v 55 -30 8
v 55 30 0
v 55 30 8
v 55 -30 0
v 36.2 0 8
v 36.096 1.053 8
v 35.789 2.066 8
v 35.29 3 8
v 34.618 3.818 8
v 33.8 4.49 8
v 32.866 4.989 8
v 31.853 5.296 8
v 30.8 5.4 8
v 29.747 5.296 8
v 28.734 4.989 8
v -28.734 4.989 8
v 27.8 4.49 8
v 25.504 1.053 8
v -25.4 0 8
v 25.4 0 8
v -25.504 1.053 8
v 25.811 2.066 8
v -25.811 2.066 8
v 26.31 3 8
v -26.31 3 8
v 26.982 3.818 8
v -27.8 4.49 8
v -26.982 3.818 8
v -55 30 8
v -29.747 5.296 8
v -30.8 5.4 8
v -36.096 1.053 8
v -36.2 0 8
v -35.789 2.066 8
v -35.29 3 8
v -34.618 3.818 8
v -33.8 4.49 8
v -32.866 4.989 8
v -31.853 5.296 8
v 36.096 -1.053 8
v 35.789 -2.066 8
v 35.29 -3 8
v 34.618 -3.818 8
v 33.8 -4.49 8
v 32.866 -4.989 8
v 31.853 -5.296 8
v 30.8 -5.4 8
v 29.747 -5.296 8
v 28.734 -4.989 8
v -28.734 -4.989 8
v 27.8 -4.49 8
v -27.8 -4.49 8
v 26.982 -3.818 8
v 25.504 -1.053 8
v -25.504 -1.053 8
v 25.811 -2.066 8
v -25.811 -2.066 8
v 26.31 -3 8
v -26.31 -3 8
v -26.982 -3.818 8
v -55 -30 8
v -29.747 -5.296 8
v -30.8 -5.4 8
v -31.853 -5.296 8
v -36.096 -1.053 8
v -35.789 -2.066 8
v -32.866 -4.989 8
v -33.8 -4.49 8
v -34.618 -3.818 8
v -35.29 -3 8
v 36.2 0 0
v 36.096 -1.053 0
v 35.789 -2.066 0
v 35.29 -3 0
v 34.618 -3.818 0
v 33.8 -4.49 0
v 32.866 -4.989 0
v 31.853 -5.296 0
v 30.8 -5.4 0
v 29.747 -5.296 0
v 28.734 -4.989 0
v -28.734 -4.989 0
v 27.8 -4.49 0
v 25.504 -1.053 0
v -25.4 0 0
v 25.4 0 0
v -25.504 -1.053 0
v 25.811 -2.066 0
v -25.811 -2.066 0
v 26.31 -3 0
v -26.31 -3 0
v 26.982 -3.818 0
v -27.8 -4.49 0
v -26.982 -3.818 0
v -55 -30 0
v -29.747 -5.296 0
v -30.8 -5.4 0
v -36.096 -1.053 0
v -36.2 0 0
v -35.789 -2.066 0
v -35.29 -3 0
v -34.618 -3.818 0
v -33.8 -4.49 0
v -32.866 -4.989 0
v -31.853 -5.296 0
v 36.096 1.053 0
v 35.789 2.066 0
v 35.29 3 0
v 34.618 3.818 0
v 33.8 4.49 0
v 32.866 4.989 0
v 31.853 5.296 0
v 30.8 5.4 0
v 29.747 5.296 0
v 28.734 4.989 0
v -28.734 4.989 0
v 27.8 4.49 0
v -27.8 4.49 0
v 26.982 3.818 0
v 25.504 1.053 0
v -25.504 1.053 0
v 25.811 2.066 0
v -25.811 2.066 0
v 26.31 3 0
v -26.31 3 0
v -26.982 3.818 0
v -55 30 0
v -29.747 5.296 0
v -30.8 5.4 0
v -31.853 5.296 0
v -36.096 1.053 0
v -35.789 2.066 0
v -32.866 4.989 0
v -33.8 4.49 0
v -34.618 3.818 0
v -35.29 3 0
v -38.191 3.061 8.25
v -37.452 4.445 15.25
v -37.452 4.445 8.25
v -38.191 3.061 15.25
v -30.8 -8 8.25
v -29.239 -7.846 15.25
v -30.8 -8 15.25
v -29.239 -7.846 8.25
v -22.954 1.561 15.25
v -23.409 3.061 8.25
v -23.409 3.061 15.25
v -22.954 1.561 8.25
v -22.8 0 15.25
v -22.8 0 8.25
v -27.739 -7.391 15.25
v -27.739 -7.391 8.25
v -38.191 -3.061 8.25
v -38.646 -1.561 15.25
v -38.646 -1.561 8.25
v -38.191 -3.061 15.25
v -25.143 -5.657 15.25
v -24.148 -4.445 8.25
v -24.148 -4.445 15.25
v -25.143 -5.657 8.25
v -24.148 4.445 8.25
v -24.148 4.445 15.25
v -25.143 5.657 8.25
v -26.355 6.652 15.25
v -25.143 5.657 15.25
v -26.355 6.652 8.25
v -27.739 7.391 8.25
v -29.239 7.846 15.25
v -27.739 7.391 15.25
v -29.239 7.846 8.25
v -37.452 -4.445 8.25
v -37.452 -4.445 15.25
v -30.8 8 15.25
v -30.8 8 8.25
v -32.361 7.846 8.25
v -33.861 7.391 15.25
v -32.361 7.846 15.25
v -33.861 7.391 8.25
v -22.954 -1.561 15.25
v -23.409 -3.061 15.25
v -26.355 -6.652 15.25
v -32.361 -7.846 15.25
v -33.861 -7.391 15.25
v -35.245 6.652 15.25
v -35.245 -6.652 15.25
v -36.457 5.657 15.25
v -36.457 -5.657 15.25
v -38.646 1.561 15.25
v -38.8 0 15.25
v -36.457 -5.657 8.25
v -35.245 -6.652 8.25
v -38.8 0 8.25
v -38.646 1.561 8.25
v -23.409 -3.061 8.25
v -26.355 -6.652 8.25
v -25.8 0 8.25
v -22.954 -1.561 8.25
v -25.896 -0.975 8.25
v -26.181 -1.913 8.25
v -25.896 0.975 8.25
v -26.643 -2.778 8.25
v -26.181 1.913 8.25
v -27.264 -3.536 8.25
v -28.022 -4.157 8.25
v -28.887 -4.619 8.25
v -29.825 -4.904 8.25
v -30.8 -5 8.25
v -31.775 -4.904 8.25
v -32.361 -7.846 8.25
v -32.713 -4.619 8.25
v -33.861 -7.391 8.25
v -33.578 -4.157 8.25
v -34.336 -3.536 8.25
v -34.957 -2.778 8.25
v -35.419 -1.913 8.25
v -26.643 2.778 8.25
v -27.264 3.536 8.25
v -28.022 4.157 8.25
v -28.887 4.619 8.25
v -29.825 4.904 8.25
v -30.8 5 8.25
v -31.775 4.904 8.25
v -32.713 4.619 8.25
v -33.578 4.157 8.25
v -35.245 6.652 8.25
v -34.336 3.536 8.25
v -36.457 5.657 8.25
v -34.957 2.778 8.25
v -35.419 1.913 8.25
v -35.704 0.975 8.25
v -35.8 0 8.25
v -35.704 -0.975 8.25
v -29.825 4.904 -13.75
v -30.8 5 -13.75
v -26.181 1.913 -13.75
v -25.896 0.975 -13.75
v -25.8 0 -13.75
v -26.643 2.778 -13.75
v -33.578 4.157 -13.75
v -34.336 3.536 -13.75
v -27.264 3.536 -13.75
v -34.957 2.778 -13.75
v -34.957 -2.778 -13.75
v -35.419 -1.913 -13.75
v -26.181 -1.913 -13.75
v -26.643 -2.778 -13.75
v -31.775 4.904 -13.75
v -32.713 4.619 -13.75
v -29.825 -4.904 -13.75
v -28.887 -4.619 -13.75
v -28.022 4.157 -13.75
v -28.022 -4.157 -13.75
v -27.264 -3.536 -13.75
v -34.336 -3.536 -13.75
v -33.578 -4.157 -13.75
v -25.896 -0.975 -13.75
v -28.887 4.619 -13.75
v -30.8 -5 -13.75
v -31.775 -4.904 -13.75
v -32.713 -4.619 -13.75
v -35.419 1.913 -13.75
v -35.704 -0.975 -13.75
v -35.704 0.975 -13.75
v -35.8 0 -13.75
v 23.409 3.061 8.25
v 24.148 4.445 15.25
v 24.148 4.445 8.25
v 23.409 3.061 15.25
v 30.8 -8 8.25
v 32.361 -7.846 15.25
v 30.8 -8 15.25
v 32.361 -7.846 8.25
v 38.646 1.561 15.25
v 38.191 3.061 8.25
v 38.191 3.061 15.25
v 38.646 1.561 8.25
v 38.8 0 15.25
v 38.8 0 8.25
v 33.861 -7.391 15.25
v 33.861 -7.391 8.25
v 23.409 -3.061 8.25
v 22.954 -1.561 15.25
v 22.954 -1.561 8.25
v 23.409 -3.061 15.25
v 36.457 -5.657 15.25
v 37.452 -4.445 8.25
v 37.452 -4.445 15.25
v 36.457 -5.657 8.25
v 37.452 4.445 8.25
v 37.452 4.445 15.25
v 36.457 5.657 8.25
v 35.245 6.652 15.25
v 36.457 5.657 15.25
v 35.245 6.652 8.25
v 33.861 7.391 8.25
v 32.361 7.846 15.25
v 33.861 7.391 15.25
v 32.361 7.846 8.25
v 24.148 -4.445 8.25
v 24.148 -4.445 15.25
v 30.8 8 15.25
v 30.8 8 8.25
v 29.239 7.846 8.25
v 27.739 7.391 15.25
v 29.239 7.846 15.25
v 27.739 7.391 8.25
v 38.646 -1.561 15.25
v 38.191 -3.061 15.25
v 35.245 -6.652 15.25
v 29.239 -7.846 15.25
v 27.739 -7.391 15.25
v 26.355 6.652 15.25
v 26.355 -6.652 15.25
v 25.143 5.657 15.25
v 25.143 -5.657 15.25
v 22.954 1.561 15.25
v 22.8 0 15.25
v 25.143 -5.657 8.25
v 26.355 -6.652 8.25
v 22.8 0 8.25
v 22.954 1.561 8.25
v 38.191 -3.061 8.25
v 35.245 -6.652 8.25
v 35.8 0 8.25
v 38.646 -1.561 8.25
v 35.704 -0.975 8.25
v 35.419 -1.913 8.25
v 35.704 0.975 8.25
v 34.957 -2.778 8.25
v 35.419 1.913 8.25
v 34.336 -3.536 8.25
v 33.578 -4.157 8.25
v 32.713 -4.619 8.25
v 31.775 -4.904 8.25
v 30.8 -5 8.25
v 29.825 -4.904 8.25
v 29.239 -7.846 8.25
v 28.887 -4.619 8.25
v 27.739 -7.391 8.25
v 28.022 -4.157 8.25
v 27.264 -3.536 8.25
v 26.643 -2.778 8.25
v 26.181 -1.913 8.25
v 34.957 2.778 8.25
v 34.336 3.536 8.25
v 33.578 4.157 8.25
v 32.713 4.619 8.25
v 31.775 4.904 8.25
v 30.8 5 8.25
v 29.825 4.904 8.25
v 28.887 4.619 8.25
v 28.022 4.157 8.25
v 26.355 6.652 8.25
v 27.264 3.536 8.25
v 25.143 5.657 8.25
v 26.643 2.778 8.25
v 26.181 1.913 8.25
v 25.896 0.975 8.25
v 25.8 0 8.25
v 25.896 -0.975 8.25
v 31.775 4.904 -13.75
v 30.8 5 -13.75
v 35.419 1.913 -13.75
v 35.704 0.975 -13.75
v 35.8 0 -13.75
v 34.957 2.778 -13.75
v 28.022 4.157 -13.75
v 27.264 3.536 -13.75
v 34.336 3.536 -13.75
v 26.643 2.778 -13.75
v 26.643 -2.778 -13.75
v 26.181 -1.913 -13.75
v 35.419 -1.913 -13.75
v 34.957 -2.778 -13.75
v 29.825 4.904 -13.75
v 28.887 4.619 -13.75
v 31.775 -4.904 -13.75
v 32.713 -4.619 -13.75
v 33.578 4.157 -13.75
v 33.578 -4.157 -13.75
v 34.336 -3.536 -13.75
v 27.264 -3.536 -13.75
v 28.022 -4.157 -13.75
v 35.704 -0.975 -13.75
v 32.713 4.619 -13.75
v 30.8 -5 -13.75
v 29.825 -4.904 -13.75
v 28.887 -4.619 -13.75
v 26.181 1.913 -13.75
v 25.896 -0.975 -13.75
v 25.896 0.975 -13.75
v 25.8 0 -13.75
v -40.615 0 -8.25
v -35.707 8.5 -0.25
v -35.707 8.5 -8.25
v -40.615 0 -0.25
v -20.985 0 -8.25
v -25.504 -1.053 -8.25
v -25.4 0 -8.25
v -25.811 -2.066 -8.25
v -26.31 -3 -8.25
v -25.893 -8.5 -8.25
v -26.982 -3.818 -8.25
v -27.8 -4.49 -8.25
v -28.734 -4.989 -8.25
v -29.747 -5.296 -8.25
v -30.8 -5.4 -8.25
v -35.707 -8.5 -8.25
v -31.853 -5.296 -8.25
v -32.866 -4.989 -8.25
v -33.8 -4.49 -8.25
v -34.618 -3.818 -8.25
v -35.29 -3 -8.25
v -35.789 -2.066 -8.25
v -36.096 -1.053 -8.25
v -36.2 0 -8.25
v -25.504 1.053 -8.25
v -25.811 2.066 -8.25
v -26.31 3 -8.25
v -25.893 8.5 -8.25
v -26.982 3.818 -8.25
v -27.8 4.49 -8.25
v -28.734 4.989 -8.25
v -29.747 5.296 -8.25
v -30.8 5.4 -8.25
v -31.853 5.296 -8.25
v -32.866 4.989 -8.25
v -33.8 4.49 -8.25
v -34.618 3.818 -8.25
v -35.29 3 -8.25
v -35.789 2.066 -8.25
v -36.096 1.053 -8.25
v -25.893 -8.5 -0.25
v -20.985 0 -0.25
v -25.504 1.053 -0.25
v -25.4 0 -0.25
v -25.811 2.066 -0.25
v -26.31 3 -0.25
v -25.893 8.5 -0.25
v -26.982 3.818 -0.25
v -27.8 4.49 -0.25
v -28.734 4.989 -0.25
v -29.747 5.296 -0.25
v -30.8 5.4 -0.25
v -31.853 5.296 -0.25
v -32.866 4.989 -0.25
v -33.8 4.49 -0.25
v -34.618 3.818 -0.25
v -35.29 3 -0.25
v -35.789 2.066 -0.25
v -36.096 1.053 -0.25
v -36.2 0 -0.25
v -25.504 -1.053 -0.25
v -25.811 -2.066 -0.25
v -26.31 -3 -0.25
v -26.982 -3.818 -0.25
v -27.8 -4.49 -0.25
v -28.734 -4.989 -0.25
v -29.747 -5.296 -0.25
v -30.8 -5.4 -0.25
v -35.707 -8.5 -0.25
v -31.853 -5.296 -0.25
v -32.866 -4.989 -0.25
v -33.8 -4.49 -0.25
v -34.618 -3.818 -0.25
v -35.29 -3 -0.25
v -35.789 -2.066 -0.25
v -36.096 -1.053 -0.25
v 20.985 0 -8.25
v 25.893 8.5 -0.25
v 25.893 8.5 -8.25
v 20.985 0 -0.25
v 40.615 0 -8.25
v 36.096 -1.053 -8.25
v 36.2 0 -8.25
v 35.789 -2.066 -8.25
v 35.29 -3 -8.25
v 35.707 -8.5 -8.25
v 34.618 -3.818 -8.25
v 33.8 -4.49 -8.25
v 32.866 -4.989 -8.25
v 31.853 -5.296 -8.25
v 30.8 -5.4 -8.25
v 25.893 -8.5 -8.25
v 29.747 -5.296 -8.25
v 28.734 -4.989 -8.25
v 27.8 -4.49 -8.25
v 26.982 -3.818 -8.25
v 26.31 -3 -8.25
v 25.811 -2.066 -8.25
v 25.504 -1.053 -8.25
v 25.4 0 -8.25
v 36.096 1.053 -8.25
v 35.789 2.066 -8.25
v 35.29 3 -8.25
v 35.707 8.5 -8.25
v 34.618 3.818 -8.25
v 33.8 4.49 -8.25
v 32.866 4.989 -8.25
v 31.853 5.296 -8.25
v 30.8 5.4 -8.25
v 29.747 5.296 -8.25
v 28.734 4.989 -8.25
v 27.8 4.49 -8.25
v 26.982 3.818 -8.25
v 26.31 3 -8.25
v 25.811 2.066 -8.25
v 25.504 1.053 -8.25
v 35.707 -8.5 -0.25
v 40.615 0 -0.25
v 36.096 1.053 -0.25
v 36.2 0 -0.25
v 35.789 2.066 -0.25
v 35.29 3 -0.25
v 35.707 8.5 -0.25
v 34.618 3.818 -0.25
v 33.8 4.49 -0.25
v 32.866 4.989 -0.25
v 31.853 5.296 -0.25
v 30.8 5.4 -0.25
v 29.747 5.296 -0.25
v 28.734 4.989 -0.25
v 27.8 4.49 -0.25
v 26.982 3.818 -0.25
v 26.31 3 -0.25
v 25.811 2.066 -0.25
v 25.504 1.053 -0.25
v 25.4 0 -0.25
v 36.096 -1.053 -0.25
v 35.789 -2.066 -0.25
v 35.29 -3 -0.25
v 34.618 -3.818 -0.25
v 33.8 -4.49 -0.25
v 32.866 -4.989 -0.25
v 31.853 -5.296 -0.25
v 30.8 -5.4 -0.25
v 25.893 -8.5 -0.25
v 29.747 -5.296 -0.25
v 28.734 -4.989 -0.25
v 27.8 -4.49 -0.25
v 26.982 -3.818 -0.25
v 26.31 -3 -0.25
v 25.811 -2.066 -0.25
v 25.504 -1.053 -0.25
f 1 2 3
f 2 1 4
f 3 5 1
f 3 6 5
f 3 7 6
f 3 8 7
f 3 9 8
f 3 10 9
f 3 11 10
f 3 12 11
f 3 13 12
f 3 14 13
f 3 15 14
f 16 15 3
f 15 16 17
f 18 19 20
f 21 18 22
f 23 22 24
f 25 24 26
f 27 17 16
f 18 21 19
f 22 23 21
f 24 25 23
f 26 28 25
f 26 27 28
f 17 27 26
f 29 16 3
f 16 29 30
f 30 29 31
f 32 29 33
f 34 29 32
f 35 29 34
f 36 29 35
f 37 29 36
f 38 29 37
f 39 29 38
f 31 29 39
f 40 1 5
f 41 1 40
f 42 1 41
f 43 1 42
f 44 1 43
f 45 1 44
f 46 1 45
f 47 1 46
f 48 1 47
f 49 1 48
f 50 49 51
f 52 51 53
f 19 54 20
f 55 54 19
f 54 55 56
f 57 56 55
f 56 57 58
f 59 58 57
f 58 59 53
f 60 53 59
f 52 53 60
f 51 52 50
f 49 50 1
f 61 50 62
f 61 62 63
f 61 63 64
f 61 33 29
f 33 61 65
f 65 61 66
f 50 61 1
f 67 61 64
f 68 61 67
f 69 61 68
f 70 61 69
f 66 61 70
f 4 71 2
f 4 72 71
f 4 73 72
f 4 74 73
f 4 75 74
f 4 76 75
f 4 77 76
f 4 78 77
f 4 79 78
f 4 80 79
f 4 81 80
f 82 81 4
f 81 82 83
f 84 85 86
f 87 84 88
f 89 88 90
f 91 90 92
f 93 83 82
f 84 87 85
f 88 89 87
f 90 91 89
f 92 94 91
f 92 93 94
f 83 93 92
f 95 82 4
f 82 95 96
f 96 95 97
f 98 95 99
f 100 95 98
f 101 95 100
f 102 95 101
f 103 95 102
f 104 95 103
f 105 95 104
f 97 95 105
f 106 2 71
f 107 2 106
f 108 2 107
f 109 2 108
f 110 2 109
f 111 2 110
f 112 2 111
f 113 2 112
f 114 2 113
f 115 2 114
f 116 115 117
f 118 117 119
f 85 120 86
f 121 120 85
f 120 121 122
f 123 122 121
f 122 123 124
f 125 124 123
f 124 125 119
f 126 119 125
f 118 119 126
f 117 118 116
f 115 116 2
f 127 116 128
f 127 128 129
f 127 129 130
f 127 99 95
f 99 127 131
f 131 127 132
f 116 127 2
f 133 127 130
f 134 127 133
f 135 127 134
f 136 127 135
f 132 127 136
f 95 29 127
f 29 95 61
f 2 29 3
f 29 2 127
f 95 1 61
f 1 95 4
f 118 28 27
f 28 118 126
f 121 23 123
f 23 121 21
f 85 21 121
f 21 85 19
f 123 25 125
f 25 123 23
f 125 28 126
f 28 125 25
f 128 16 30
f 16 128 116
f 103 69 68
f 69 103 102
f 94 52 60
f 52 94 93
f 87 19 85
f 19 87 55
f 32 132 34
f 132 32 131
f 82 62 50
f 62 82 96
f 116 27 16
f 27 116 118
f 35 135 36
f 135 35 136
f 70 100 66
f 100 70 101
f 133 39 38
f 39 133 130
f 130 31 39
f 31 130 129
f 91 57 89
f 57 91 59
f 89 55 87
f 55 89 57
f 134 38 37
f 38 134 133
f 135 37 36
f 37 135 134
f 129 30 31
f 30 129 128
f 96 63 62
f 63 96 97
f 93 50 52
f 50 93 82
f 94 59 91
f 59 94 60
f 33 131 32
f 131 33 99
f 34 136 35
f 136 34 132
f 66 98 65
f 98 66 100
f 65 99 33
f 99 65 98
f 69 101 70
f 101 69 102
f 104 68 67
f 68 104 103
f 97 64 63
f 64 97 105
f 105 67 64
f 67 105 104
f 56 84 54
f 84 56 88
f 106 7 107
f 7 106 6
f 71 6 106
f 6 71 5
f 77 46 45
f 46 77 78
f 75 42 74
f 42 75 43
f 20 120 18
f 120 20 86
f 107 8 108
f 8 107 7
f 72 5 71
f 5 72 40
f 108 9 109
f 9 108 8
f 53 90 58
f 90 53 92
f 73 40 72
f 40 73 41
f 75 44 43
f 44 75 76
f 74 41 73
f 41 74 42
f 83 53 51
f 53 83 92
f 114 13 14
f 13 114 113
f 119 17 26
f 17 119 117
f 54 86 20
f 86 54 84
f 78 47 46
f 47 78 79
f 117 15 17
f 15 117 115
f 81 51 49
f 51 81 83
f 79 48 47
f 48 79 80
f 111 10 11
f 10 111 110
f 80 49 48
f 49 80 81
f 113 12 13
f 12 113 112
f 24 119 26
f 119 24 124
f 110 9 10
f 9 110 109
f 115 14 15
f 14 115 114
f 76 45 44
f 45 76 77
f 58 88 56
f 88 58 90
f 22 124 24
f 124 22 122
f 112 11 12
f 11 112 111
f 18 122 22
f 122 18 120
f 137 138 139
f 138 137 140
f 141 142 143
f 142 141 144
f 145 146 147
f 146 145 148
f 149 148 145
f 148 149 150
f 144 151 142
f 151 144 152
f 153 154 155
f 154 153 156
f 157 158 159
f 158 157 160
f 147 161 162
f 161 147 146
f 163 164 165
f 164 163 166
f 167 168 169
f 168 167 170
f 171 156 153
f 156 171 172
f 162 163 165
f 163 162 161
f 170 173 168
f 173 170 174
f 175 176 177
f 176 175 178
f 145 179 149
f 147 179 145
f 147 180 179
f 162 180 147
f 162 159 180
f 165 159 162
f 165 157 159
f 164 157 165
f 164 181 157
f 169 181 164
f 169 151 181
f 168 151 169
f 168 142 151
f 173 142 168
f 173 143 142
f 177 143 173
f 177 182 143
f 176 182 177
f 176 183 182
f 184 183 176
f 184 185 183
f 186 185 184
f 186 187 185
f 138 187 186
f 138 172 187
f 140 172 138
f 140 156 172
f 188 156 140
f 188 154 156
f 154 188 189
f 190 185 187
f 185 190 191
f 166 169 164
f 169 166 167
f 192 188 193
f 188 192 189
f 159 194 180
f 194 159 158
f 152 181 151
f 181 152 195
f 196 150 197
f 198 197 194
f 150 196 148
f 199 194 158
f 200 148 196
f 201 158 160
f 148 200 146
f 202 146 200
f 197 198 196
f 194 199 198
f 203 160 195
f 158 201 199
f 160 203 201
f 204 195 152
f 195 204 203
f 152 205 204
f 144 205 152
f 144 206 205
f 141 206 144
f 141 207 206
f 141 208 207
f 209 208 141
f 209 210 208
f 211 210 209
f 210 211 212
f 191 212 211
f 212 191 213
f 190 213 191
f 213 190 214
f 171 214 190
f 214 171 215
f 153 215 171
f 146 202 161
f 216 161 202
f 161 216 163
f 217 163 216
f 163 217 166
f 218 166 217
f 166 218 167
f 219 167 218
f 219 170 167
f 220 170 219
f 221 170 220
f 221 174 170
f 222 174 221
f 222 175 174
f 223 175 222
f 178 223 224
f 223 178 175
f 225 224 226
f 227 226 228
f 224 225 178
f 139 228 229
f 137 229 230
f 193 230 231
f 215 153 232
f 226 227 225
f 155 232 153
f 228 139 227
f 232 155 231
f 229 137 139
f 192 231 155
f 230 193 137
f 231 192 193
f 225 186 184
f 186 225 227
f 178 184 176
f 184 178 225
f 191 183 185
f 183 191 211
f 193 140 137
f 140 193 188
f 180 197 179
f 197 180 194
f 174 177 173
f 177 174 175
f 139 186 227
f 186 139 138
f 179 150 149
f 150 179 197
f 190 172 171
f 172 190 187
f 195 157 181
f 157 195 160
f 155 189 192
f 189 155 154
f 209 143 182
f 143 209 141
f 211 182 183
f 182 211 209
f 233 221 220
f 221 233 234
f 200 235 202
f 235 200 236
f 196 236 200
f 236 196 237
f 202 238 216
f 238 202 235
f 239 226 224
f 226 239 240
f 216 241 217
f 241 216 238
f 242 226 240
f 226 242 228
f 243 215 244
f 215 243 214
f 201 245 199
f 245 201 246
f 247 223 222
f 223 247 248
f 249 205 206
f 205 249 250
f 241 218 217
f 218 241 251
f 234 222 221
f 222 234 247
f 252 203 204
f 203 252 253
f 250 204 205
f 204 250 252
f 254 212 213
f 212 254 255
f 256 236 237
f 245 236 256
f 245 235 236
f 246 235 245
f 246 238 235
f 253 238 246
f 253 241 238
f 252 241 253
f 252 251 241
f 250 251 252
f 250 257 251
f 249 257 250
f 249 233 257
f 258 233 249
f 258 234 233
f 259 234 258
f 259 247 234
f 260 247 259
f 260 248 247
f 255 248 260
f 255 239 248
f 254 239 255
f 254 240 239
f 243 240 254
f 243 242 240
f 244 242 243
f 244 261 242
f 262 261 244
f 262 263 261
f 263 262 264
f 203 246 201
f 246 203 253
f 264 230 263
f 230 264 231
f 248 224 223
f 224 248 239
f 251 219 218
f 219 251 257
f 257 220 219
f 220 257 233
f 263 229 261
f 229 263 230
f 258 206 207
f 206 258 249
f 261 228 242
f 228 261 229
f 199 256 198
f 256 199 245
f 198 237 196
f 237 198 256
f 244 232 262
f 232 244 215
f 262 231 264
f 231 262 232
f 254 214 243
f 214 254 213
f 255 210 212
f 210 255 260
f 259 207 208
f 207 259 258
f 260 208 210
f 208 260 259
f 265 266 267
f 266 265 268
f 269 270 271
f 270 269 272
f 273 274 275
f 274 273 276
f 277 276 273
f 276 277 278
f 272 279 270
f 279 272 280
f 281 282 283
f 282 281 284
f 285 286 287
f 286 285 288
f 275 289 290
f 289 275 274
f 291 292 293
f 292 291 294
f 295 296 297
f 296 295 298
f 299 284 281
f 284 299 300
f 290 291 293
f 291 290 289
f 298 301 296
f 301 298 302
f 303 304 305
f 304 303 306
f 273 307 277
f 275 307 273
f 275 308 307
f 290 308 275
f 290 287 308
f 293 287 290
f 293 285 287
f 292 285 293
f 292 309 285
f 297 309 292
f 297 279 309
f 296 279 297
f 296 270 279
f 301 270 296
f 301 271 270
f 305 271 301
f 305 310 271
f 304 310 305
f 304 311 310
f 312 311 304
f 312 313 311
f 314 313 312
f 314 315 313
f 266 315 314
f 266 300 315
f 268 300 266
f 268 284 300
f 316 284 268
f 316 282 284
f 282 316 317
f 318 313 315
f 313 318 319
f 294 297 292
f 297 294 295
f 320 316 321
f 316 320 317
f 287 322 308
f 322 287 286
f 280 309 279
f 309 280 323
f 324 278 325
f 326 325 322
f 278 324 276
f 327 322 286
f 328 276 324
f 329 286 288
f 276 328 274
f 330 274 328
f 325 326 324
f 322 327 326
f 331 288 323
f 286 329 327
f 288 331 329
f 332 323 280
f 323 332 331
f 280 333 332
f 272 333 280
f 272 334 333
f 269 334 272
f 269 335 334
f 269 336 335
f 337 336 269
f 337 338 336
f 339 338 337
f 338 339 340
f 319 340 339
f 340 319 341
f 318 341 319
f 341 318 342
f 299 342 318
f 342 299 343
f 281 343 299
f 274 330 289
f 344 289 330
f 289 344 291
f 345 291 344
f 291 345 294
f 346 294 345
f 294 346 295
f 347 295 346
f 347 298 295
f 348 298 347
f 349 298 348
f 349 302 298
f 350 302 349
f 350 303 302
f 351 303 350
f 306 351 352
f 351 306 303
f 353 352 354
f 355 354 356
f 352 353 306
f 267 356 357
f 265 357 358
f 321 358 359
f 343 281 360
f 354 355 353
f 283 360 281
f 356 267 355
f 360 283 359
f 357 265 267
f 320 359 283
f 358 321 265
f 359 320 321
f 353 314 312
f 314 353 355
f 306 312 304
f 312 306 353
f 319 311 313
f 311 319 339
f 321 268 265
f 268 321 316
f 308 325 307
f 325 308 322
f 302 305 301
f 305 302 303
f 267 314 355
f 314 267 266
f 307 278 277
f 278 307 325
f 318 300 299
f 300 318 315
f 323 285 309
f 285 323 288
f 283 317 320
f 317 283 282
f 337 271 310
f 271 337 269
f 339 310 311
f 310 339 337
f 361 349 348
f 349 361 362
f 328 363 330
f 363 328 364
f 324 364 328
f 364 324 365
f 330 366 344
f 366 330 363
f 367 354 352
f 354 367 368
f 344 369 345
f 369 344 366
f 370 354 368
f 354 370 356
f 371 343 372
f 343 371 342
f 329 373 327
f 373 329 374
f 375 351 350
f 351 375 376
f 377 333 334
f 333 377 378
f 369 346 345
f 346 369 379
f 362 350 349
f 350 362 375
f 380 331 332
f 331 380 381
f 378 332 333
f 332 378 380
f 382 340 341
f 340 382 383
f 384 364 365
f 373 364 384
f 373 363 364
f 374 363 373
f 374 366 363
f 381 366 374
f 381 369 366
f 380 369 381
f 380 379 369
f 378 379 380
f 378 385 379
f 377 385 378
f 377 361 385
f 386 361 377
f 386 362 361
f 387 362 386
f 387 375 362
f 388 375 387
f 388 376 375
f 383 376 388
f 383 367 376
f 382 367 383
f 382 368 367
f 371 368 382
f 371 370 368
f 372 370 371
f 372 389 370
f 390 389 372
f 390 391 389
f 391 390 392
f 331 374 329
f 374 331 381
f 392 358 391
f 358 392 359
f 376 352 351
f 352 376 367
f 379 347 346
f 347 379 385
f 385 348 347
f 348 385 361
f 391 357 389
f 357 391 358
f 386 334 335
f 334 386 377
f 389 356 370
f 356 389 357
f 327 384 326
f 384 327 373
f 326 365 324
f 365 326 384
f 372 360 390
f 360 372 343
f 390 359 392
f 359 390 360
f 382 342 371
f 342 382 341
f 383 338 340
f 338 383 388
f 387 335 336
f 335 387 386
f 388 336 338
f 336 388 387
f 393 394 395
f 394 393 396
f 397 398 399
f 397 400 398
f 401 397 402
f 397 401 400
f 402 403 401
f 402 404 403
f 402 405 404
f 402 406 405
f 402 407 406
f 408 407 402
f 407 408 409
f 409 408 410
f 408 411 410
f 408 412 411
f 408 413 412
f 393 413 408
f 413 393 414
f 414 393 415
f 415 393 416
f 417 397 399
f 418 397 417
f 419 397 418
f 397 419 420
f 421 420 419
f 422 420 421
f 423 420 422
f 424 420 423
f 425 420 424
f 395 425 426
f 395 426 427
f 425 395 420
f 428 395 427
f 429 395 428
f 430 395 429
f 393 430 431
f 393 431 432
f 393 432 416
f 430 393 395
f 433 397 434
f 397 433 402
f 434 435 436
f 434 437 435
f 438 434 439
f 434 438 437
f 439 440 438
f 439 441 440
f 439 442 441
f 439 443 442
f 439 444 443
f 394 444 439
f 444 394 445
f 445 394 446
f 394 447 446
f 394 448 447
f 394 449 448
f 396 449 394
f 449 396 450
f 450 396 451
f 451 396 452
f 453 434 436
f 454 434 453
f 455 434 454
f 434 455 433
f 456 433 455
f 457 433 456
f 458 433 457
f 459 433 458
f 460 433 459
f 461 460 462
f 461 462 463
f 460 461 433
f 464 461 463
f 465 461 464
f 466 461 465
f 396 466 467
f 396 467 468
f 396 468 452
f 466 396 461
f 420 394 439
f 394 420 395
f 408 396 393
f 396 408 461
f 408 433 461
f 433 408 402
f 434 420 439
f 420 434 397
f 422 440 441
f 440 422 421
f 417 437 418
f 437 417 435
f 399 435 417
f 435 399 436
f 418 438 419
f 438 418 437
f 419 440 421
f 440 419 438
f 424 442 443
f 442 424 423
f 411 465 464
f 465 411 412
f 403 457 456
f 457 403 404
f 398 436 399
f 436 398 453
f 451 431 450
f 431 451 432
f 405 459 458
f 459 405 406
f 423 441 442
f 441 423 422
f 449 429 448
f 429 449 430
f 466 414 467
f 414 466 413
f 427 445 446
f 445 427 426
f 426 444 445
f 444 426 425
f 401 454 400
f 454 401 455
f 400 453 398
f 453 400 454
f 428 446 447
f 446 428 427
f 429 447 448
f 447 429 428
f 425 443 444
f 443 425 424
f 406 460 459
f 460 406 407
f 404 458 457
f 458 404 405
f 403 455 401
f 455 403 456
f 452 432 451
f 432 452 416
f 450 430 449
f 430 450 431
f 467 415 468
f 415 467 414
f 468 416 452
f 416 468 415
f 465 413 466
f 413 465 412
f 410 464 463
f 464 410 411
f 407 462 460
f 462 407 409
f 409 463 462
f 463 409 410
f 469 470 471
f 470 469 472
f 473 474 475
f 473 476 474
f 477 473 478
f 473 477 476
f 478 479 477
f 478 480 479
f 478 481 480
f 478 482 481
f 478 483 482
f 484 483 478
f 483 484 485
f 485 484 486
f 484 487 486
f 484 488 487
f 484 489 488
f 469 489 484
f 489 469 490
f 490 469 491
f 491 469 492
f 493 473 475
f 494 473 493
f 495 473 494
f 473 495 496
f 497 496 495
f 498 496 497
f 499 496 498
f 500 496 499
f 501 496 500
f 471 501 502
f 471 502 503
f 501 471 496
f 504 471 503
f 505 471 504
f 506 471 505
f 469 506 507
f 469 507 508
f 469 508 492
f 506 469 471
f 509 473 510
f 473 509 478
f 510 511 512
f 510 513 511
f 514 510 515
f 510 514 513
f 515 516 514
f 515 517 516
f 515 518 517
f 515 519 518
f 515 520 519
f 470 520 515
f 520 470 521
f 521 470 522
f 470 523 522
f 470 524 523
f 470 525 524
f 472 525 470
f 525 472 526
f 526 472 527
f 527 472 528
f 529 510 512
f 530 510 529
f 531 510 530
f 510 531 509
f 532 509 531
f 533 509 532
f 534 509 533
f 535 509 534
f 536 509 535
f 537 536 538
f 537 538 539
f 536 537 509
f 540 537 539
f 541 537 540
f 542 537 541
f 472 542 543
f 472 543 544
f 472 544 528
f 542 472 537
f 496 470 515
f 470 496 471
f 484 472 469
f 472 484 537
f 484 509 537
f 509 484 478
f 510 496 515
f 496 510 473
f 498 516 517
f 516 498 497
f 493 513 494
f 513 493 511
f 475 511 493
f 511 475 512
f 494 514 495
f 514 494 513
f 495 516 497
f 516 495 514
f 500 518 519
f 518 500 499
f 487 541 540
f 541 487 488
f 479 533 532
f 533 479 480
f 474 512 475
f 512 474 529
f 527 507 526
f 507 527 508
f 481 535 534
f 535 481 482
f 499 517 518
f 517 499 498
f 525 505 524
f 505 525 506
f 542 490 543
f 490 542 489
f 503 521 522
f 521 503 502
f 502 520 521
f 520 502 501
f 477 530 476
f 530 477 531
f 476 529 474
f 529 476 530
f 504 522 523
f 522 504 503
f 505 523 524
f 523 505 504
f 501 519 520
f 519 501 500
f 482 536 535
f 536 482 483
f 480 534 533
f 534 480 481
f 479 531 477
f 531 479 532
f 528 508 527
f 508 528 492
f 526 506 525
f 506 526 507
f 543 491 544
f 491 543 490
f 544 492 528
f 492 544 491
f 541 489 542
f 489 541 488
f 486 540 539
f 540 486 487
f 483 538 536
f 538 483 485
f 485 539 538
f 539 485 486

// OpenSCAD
$fn = 32;

// ------------------------------------------------------------------------
// Bolted plate: 110 x 60 x 8 mm plate, 2 fasteners
// Every part is its own module, assembly() places them once.
// ------------------------------------------------------------------------

// --- part 1 ---
module plate() {
  difference() {
    translate([-55, -30, 0]) cube([110, 60, 8]);
    translate([-30.8, 0, -1]) cylinder(h = 10, d = 10.8);
    translate([30.8, 0, -1]) cylinder(h = 10, d = 10.8);
  }
}

// --- part 2 ---
module bolt1() {
  cylinder(h = 7, d = 16);
  translate([0, 0, -22]) cylinder(h = 22, d = 10);
}

// --- part 3 ---
module bolt2() {
  cylinder(h = 7, d = 16);
  translate([0, 0, -22]) cylinder(h = 22, d = 10);
}

// --- part 4 ---
module nut1() {
  difference() {
    linear_extrude(height = 8) polygon(points = [[9.815, 0], [4.907, 8.5], [-4.907, 8.5], [-9.815, 0], [-4.907, -8.5], [4.907, -8.5]]);
    translate([0, 0, -1]) cylinder(h = 10, d = 10.8);
  }
}

// --- part 5 ---
module nut2() {
  difference() {
    linear_extrude(height = 8) polygon(points = [[9.815, 0], [4.907, 8.5], [-4.907, 8.5], [-9.815, 0], [-4.907, -8.5], [4.907, -8.5]]);
    translate([0, 0, -1]) cylinder(h = 10, d = 10.8);
  }
}

// --- assembly ---
module assembly() {
  translate([0, 0, 0]) rotate([0, 0, 0]) plate();
  translate([-30.8, 0, 8.25]) rotate([0, 0, 0]) bolt1();
  translate([30.8, 0, 8.25]) rotate([0, 0, 0]) bolt2();
  translate([-30.8, 0, -8.25]) rotate([0, 0, 0]) nut1();
  translate([30.8, 0, -8.25]) rotate([0, 0, 0]) nut2();
}

assembly();
